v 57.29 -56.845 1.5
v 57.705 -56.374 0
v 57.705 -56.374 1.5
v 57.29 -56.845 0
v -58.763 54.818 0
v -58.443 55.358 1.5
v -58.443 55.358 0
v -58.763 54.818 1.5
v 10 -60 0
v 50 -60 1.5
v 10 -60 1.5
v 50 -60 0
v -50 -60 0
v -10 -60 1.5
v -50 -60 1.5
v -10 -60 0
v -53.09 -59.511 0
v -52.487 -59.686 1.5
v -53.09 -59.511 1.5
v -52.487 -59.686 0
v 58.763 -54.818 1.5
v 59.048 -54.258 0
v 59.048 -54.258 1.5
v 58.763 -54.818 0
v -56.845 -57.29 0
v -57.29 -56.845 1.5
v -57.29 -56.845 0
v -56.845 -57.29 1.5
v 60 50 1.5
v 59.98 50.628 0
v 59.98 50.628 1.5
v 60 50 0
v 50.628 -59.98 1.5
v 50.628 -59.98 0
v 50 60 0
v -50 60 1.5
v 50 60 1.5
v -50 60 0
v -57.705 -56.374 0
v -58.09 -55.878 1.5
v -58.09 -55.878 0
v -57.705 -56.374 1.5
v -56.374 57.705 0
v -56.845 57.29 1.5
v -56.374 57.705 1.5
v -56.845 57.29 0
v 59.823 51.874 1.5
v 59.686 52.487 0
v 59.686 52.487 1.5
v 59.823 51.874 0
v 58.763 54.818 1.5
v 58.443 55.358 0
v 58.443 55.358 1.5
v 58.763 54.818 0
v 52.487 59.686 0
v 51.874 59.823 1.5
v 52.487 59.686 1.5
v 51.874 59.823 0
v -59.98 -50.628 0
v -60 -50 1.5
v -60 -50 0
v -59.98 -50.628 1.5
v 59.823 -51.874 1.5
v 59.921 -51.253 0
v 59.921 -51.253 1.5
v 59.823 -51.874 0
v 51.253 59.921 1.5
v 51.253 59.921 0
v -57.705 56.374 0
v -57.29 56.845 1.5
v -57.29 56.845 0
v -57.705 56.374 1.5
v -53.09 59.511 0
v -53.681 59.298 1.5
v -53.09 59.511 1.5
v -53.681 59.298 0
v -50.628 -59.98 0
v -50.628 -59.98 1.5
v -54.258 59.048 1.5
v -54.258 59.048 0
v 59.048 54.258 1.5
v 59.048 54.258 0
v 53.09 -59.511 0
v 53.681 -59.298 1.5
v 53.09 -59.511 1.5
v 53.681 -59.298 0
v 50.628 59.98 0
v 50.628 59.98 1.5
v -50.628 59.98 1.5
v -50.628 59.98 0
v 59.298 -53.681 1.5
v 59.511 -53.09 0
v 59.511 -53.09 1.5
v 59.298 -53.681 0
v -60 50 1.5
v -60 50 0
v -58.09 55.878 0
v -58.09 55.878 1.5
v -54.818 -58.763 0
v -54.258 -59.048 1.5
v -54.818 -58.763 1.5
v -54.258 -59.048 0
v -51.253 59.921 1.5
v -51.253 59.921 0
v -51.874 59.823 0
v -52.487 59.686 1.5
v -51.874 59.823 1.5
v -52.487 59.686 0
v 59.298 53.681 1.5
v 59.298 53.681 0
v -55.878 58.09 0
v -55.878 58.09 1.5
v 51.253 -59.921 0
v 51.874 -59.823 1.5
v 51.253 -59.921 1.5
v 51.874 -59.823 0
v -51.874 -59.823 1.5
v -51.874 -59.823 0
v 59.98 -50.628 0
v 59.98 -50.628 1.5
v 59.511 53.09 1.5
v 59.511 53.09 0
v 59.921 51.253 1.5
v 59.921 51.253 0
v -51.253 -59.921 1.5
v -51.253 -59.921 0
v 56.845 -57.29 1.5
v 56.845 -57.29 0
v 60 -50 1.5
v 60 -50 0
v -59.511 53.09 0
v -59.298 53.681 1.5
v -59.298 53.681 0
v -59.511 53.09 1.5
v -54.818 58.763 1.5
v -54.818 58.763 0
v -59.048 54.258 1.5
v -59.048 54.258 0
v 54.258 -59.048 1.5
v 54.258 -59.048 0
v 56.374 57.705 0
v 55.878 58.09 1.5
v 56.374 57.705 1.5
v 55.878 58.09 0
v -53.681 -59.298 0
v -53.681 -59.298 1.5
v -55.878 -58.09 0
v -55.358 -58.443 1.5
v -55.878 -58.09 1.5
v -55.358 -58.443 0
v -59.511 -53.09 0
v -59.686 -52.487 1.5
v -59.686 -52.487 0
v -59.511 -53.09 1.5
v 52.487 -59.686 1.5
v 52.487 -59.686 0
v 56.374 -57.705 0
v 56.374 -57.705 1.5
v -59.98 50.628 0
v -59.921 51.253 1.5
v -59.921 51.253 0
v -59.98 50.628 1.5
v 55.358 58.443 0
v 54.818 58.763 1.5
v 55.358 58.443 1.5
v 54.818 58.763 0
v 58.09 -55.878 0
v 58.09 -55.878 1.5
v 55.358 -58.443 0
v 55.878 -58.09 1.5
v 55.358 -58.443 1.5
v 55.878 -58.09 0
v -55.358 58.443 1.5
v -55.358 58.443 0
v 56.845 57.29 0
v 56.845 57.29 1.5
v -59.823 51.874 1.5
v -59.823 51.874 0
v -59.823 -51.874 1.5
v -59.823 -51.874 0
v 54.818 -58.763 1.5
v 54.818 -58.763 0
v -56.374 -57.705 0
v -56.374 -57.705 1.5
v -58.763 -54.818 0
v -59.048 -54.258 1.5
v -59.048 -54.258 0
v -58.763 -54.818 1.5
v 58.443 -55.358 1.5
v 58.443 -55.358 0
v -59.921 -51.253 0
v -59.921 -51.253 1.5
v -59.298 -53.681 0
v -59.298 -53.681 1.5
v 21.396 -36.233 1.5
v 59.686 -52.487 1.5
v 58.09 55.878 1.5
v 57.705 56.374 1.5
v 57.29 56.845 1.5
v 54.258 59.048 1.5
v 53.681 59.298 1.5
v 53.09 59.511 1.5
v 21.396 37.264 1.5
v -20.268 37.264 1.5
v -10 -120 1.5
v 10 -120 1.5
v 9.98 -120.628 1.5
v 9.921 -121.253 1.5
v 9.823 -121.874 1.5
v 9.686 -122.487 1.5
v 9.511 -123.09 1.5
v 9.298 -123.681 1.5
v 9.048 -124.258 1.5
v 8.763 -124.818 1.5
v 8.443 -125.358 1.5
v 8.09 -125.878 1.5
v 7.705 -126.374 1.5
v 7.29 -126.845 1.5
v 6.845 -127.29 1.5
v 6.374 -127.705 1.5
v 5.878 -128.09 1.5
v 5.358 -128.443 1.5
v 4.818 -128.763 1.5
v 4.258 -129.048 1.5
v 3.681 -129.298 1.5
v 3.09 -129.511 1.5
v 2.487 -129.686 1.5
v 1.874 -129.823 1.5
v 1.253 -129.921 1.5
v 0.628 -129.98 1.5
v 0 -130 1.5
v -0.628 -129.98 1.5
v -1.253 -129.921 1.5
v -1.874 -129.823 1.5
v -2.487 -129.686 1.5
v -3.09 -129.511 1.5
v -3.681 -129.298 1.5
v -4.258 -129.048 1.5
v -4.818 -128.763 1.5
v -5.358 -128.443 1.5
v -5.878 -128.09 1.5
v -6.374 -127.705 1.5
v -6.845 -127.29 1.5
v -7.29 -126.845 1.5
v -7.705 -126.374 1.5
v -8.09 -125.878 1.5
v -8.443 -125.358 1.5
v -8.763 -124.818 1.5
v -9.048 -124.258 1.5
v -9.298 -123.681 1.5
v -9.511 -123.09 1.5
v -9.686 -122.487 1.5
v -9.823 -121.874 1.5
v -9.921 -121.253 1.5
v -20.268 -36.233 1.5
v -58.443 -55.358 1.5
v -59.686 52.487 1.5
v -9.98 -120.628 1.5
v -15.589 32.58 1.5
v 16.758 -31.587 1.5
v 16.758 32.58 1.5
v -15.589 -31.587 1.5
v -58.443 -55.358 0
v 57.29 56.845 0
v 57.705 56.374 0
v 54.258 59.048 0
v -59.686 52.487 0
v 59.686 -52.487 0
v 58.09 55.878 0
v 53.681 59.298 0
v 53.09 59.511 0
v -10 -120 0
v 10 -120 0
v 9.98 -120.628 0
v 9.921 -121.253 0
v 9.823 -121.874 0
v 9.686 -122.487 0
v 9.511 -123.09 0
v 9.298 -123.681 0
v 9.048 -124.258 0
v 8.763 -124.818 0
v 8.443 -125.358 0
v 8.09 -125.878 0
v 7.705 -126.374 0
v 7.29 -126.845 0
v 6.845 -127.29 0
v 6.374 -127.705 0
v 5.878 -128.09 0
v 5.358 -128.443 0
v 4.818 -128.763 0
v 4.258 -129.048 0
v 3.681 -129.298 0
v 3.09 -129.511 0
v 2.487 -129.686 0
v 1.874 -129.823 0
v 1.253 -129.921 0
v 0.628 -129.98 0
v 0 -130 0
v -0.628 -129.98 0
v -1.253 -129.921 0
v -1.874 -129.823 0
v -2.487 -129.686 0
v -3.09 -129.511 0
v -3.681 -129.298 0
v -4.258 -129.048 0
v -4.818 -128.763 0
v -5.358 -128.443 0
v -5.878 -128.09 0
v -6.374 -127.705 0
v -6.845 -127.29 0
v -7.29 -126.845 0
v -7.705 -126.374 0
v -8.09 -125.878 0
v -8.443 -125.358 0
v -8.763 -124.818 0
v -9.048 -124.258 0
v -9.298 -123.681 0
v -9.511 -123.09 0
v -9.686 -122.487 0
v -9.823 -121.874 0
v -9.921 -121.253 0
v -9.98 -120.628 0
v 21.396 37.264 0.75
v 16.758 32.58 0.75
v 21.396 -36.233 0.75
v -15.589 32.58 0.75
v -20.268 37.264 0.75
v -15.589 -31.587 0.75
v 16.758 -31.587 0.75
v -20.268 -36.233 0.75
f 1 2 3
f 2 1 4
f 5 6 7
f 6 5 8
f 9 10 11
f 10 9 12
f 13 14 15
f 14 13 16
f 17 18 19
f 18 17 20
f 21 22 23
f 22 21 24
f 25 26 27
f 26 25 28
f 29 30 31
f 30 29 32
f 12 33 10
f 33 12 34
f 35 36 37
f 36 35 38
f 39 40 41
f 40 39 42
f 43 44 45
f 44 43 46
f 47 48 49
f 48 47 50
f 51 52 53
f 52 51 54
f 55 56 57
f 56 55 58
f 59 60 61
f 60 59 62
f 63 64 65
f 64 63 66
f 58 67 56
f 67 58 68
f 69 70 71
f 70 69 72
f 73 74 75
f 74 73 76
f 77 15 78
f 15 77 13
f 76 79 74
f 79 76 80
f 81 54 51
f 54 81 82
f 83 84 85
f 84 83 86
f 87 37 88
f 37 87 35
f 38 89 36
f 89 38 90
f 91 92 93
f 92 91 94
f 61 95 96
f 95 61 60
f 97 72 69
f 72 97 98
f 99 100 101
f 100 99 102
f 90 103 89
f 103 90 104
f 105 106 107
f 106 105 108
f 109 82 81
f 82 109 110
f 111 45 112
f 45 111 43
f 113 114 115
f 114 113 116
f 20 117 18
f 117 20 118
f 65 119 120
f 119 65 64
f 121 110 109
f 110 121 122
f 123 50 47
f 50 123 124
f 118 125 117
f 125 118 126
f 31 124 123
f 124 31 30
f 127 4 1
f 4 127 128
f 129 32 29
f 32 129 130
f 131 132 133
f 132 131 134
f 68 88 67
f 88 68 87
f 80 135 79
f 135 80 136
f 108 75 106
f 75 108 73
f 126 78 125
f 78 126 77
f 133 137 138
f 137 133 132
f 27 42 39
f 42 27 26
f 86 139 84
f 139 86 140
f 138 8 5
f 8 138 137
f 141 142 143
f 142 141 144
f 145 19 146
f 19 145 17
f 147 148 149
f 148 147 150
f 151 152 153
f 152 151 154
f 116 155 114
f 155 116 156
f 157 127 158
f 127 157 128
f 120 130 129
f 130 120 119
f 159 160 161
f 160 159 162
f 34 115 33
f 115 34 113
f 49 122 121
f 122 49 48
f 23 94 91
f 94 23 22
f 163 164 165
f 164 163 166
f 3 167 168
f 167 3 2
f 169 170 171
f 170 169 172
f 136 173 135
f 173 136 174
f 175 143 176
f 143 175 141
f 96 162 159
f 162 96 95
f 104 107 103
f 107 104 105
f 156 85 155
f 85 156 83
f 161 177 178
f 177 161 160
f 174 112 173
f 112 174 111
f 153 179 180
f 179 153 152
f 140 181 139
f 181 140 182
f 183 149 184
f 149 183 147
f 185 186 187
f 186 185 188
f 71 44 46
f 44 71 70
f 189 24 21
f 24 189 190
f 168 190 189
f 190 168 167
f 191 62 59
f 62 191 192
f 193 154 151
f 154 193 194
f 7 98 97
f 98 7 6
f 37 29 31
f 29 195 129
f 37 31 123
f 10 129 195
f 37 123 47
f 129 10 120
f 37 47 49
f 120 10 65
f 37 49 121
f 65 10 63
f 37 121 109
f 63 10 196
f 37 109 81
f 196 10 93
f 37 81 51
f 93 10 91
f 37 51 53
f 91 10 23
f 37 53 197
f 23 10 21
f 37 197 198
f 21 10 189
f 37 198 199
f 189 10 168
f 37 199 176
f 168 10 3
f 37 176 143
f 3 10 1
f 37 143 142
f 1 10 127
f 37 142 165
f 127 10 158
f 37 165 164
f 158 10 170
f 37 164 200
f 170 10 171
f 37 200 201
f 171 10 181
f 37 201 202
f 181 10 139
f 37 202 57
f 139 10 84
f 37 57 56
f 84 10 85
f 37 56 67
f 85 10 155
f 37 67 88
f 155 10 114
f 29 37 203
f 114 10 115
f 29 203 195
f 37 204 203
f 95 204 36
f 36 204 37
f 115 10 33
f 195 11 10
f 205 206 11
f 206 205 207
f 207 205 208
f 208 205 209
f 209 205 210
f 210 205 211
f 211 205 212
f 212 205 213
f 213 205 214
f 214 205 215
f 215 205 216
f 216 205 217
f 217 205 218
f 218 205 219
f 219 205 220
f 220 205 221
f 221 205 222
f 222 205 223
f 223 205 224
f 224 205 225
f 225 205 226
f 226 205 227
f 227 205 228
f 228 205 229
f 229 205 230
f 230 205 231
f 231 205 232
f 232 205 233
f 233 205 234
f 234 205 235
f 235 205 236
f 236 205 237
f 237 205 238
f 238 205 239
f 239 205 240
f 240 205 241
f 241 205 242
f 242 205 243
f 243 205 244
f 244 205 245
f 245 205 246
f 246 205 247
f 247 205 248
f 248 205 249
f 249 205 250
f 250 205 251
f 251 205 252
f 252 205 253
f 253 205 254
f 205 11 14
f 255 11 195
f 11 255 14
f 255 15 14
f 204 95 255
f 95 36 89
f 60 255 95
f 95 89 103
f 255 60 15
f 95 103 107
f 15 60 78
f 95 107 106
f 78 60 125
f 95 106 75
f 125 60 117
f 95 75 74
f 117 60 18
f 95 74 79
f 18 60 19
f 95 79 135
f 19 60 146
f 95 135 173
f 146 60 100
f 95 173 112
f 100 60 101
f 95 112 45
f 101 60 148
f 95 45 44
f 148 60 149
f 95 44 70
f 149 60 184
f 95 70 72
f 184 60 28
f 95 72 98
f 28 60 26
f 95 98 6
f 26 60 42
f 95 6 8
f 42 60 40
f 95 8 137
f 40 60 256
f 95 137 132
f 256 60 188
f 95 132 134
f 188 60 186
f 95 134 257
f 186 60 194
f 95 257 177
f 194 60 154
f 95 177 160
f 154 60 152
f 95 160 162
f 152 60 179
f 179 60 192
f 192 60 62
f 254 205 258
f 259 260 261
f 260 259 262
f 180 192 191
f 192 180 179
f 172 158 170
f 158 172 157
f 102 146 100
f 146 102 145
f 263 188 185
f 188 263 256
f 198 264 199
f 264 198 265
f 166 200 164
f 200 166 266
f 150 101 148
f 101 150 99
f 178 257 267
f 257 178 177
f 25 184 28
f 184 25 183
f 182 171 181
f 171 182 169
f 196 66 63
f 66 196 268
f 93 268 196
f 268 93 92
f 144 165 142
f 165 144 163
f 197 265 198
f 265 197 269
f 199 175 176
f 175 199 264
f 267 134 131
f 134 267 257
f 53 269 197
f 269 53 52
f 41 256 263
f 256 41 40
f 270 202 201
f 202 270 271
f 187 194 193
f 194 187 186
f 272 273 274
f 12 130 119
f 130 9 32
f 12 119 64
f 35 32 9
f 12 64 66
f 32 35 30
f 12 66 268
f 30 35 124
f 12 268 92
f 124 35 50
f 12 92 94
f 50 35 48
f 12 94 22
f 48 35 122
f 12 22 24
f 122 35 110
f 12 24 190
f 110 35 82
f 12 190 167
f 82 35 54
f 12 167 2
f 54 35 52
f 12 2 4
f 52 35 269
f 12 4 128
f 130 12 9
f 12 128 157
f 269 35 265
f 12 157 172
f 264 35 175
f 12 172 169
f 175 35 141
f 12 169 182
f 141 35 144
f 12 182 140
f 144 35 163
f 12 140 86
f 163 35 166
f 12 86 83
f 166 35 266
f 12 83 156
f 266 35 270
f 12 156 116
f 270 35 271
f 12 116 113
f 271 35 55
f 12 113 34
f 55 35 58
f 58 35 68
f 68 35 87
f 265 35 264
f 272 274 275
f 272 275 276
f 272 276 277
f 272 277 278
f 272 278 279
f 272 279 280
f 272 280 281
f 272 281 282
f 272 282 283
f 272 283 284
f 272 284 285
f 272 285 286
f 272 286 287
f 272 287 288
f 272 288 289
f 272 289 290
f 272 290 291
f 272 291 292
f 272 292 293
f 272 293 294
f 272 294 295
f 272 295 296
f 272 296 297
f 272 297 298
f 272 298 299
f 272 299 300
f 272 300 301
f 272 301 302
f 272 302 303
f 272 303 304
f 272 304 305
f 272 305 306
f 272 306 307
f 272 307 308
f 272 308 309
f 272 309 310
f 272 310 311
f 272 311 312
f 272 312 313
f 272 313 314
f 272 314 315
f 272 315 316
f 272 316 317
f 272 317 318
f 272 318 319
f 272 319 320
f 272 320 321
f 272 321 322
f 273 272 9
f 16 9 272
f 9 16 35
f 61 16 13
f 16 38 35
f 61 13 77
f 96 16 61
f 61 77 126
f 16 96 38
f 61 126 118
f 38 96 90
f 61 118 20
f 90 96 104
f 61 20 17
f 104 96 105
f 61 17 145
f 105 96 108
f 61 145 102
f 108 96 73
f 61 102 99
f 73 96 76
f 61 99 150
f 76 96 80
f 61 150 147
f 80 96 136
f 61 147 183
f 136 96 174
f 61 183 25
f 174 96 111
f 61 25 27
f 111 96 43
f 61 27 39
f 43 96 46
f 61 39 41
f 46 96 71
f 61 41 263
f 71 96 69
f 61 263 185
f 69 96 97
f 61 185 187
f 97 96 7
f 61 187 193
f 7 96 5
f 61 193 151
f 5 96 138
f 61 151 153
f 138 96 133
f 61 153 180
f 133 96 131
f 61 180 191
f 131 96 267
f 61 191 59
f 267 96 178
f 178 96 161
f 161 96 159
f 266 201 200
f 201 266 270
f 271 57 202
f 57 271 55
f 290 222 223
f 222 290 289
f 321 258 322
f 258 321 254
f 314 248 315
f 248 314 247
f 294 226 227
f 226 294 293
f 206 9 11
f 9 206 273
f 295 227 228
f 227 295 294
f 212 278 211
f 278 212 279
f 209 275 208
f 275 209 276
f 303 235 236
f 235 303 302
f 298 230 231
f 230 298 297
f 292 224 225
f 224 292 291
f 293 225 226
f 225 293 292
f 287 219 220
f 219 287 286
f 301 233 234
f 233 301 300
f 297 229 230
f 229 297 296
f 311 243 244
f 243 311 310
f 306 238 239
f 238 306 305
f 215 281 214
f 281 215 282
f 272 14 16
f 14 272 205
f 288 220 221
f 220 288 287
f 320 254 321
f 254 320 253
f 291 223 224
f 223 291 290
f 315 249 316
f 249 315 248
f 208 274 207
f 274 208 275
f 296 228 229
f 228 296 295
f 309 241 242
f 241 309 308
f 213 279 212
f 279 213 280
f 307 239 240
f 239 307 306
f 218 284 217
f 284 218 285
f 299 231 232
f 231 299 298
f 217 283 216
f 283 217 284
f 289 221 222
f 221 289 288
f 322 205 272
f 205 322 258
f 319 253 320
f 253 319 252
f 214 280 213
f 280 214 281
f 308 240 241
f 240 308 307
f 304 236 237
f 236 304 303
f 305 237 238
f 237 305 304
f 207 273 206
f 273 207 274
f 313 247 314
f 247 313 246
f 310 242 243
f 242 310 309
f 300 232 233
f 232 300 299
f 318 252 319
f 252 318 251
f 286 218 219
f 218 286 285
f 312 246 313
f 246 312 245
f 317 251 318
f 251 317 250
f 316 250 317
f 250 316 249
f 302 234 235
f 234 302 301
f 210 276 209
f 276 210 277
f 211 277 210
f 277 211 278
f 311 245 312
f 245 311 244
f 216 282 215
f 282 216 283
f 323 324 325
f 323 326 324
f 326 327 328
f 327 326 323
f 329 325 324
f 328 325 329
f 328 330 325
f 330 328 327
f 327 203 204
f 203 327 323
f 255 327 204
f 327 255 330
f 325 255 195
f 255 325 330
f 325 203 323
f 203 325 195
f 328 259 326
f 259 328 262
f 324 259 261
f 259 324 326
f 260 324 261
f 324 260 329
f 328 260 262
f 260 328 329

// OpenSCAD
WIDTH = 120;
LENGTH = WIDTH;
THICKNESS = 1.5;
HANDLE_LENGTH = 80;
HANDLE_WIDTH = 20;
CORNER_DIA = 20;

NUMBER = "👏";
NUMBER_SIZE = min(LENGTH, WIDTH) * 0.5;
NUMBER_FONT = "Segoe UI Emoji";
NUMBER_OFFSET = 0;

$fn = 100;

module rounded_rect(width, length, height, corner_dia) {
    hull() {
        for(i = [-1, 1]) {
            for(j = [-1, 1]) {
                translate([i * (width - corner_dia)/2, j * (length - corner_dia)/2, 0])
                cylinder(d = corner_dia, h = height);
            }
        }
    }
}

difference() {
    union() {
        rounded_rect(WIDTH, LENGTH, THICKNESS, CORNER_DIA);
        translate([0, -LENGTH/2 -HANDLE_LENGTH/2 +CORNER_DIA/2, 0])
        rounded_rect(HANDLE_WIDTH, HANDLE_LENGTH, THICKNESS, CORNER_DIA);
    }
    
    translate([0, NUMBER_OFFSET, THICKNESS/2])
    linear_extrude(THICKNESS/2)
    text(NUMBER, font=NUMBER_FONT, halign="center", valign="center", size = NUMBER_SIZE);
}
